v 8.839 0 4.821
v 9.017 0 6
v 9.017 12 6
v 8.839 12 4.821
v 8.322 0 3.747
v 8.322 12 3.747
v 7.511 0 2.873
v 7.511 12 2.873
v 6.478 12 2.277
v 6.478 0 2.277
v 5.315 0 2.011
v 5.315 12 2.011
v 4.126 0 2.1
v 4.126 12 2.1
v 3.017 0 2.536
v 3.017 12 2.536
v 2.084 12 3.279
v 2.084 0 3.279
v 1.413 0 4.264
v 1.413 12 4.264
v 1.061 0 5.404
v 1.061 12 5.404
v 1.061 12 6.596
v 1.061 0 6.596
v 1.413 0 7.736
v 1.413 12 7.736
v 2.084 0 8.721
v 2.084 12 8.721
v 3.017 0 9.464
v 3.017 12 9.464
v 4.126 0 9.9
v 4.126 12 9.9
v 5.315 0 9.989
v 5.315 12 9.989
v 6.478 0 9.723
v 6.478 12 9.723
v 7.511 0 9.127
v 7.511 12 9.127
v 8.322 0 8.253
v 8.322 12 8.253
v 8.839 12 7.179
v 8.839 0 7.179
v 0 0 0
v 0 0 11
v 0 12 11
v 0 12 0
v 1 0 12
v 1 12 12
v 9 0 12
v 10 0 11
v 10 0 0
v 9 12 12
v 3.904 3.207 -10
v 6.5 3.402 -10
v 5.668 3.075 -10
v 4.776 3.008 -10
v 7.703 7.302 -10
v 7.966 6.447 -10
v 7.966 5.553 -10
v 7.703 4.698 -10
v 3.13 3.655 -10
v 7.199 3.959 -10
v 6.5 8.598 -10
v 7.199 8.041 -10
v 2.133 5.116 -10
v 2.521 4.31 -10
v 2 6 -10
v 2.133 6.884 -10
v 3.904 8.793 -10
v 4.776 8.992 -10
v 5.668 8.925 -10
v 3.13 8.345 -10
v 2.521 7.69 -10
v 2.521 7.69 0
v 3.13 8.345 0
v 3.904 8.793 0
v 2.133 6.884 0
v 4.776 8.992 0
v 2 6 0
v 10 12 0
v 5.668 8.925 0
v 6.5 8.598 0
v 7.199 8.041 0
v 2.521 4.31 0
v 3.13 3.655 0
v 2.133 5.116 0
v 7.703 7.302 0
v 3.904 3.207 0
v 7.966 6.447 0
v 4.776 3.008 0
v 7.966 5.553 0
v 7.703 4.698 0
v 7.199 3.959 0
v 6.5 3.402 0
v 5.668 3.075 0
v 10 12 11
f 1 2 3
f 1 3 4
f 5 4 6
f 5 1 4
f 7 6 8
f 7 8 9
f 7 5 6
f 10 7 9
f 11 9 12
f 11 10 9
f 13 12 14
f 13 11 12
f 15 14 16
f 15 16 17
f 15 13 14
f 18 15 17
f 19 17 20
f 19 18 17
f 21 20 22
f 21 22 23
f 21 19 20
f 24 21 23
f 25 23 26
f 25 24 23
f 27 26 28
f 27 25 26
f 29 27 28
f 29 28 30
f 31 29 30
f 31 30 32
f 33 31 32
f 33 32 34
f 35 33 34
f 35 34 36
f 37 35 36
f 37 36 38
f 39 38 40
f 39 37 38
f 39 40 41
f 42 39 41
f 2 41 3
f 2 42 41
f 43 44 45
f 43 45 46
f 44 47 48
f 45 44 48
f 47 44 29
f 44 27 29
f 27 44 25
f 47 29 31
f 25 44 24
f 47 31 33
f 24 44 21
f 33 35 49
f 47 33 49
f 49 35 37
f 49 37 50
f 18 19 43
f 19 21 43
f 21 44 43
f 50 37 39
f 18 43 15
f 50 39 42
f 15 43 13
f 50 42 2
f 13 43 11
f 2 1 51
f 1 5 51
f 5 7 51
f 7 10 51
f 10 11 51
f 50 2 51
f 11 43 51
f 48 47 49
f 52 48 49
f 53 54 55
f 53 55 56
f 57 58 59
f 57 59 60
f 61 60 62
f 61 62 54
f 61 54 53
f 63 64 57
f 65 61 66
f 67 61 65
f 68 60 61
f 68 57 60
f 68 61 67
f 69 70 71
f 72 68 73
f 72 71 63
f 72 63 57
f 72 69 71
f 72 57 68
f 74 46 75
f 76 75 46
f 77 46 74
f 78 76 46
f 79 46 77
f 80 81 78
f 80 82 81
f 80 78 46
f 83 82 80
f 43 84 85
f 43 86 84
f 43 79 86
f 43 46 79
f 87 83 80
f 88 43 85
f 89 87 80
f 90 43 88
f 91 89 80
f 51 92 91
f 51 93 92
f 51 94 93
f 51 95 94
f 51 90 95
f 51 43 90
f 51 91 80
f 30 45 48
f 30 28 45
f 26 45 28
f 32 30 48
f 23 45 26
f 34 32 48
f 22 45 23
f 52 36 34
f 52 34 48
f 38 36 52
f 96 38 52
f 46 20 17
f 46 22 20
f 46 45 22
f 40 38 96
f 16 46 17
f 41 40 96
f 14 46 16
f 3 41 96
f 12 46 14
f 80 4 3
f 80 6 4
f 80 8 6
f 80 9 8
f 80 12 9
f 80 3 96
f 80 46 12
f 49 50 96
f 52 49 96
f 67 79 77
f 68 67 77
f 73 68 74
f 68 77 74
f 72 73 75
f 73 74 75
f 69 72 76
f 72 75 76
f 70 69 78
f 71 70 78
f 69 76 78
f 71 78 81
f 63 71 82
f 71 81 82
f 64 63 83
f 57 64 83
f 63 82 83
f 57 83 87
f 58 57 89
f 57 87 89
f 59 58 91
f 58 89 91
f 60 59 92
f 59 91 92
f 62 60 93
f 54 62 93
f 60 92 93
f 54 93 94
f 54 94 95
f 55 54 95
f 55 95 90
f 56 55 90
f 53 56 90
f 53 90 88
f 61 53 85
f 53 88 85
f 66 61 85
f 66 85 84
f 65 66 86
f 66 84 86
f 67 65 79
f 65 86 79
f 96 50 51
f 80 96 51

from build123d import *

# Parameters (mm, degrees)
CROQUIS1_W              = 10
CROQUIS1_H              = 12
CROQUIS1_R              = 4
SALIENTE_EXTRUIR1_DEPTH = 12
CHAFL_N1_SIZE           = 1
CROQUIS2_R              = 3
SALIENTE_EXTRUIR2_DEPTH = 10


with BuildPart() as part:
    # Croquis1 → Saliente-Extruir1 (new body)
    with BuildSketch(Plane(origin=(0, 0, 0), x_dir=(1, 0, 0), z_dir=(0, 1, 0))):
        with Locations((5, -6)):
            Rectangle(CROQUIS1_W, CROQUIS1_H)
        with Locations((5.016573561, -6)):
            Circle(CROQUIS1_R, mode=Mode.SUBTRACT)
    extrude(amount=SALIENTE_EXTRUIR1_DEPTH)

    # Chaflán1
    chafl_n1_edges = [part.edges().sort_by_distance(p)[0] for p in [
        (10, 6, 12),
        (0, 6, 12),
    ]]
    chamfer(chafl_n1_edges, length=CHAFL_N1_SIZE)

    # Croquis2 → Saliente-Extruir2 (add)
    with BuildSketch(Plane(origin=(0, 0, 0), x_dir=(-1, 0, 0), z_dir=(0, 0, -1))):
        with Locations((-5, 6)):
            Circle(CROQUIS2_R)
    extrude(amount=SALIENTE_EXTRUIR2_DEPTH)


solid = part.part
